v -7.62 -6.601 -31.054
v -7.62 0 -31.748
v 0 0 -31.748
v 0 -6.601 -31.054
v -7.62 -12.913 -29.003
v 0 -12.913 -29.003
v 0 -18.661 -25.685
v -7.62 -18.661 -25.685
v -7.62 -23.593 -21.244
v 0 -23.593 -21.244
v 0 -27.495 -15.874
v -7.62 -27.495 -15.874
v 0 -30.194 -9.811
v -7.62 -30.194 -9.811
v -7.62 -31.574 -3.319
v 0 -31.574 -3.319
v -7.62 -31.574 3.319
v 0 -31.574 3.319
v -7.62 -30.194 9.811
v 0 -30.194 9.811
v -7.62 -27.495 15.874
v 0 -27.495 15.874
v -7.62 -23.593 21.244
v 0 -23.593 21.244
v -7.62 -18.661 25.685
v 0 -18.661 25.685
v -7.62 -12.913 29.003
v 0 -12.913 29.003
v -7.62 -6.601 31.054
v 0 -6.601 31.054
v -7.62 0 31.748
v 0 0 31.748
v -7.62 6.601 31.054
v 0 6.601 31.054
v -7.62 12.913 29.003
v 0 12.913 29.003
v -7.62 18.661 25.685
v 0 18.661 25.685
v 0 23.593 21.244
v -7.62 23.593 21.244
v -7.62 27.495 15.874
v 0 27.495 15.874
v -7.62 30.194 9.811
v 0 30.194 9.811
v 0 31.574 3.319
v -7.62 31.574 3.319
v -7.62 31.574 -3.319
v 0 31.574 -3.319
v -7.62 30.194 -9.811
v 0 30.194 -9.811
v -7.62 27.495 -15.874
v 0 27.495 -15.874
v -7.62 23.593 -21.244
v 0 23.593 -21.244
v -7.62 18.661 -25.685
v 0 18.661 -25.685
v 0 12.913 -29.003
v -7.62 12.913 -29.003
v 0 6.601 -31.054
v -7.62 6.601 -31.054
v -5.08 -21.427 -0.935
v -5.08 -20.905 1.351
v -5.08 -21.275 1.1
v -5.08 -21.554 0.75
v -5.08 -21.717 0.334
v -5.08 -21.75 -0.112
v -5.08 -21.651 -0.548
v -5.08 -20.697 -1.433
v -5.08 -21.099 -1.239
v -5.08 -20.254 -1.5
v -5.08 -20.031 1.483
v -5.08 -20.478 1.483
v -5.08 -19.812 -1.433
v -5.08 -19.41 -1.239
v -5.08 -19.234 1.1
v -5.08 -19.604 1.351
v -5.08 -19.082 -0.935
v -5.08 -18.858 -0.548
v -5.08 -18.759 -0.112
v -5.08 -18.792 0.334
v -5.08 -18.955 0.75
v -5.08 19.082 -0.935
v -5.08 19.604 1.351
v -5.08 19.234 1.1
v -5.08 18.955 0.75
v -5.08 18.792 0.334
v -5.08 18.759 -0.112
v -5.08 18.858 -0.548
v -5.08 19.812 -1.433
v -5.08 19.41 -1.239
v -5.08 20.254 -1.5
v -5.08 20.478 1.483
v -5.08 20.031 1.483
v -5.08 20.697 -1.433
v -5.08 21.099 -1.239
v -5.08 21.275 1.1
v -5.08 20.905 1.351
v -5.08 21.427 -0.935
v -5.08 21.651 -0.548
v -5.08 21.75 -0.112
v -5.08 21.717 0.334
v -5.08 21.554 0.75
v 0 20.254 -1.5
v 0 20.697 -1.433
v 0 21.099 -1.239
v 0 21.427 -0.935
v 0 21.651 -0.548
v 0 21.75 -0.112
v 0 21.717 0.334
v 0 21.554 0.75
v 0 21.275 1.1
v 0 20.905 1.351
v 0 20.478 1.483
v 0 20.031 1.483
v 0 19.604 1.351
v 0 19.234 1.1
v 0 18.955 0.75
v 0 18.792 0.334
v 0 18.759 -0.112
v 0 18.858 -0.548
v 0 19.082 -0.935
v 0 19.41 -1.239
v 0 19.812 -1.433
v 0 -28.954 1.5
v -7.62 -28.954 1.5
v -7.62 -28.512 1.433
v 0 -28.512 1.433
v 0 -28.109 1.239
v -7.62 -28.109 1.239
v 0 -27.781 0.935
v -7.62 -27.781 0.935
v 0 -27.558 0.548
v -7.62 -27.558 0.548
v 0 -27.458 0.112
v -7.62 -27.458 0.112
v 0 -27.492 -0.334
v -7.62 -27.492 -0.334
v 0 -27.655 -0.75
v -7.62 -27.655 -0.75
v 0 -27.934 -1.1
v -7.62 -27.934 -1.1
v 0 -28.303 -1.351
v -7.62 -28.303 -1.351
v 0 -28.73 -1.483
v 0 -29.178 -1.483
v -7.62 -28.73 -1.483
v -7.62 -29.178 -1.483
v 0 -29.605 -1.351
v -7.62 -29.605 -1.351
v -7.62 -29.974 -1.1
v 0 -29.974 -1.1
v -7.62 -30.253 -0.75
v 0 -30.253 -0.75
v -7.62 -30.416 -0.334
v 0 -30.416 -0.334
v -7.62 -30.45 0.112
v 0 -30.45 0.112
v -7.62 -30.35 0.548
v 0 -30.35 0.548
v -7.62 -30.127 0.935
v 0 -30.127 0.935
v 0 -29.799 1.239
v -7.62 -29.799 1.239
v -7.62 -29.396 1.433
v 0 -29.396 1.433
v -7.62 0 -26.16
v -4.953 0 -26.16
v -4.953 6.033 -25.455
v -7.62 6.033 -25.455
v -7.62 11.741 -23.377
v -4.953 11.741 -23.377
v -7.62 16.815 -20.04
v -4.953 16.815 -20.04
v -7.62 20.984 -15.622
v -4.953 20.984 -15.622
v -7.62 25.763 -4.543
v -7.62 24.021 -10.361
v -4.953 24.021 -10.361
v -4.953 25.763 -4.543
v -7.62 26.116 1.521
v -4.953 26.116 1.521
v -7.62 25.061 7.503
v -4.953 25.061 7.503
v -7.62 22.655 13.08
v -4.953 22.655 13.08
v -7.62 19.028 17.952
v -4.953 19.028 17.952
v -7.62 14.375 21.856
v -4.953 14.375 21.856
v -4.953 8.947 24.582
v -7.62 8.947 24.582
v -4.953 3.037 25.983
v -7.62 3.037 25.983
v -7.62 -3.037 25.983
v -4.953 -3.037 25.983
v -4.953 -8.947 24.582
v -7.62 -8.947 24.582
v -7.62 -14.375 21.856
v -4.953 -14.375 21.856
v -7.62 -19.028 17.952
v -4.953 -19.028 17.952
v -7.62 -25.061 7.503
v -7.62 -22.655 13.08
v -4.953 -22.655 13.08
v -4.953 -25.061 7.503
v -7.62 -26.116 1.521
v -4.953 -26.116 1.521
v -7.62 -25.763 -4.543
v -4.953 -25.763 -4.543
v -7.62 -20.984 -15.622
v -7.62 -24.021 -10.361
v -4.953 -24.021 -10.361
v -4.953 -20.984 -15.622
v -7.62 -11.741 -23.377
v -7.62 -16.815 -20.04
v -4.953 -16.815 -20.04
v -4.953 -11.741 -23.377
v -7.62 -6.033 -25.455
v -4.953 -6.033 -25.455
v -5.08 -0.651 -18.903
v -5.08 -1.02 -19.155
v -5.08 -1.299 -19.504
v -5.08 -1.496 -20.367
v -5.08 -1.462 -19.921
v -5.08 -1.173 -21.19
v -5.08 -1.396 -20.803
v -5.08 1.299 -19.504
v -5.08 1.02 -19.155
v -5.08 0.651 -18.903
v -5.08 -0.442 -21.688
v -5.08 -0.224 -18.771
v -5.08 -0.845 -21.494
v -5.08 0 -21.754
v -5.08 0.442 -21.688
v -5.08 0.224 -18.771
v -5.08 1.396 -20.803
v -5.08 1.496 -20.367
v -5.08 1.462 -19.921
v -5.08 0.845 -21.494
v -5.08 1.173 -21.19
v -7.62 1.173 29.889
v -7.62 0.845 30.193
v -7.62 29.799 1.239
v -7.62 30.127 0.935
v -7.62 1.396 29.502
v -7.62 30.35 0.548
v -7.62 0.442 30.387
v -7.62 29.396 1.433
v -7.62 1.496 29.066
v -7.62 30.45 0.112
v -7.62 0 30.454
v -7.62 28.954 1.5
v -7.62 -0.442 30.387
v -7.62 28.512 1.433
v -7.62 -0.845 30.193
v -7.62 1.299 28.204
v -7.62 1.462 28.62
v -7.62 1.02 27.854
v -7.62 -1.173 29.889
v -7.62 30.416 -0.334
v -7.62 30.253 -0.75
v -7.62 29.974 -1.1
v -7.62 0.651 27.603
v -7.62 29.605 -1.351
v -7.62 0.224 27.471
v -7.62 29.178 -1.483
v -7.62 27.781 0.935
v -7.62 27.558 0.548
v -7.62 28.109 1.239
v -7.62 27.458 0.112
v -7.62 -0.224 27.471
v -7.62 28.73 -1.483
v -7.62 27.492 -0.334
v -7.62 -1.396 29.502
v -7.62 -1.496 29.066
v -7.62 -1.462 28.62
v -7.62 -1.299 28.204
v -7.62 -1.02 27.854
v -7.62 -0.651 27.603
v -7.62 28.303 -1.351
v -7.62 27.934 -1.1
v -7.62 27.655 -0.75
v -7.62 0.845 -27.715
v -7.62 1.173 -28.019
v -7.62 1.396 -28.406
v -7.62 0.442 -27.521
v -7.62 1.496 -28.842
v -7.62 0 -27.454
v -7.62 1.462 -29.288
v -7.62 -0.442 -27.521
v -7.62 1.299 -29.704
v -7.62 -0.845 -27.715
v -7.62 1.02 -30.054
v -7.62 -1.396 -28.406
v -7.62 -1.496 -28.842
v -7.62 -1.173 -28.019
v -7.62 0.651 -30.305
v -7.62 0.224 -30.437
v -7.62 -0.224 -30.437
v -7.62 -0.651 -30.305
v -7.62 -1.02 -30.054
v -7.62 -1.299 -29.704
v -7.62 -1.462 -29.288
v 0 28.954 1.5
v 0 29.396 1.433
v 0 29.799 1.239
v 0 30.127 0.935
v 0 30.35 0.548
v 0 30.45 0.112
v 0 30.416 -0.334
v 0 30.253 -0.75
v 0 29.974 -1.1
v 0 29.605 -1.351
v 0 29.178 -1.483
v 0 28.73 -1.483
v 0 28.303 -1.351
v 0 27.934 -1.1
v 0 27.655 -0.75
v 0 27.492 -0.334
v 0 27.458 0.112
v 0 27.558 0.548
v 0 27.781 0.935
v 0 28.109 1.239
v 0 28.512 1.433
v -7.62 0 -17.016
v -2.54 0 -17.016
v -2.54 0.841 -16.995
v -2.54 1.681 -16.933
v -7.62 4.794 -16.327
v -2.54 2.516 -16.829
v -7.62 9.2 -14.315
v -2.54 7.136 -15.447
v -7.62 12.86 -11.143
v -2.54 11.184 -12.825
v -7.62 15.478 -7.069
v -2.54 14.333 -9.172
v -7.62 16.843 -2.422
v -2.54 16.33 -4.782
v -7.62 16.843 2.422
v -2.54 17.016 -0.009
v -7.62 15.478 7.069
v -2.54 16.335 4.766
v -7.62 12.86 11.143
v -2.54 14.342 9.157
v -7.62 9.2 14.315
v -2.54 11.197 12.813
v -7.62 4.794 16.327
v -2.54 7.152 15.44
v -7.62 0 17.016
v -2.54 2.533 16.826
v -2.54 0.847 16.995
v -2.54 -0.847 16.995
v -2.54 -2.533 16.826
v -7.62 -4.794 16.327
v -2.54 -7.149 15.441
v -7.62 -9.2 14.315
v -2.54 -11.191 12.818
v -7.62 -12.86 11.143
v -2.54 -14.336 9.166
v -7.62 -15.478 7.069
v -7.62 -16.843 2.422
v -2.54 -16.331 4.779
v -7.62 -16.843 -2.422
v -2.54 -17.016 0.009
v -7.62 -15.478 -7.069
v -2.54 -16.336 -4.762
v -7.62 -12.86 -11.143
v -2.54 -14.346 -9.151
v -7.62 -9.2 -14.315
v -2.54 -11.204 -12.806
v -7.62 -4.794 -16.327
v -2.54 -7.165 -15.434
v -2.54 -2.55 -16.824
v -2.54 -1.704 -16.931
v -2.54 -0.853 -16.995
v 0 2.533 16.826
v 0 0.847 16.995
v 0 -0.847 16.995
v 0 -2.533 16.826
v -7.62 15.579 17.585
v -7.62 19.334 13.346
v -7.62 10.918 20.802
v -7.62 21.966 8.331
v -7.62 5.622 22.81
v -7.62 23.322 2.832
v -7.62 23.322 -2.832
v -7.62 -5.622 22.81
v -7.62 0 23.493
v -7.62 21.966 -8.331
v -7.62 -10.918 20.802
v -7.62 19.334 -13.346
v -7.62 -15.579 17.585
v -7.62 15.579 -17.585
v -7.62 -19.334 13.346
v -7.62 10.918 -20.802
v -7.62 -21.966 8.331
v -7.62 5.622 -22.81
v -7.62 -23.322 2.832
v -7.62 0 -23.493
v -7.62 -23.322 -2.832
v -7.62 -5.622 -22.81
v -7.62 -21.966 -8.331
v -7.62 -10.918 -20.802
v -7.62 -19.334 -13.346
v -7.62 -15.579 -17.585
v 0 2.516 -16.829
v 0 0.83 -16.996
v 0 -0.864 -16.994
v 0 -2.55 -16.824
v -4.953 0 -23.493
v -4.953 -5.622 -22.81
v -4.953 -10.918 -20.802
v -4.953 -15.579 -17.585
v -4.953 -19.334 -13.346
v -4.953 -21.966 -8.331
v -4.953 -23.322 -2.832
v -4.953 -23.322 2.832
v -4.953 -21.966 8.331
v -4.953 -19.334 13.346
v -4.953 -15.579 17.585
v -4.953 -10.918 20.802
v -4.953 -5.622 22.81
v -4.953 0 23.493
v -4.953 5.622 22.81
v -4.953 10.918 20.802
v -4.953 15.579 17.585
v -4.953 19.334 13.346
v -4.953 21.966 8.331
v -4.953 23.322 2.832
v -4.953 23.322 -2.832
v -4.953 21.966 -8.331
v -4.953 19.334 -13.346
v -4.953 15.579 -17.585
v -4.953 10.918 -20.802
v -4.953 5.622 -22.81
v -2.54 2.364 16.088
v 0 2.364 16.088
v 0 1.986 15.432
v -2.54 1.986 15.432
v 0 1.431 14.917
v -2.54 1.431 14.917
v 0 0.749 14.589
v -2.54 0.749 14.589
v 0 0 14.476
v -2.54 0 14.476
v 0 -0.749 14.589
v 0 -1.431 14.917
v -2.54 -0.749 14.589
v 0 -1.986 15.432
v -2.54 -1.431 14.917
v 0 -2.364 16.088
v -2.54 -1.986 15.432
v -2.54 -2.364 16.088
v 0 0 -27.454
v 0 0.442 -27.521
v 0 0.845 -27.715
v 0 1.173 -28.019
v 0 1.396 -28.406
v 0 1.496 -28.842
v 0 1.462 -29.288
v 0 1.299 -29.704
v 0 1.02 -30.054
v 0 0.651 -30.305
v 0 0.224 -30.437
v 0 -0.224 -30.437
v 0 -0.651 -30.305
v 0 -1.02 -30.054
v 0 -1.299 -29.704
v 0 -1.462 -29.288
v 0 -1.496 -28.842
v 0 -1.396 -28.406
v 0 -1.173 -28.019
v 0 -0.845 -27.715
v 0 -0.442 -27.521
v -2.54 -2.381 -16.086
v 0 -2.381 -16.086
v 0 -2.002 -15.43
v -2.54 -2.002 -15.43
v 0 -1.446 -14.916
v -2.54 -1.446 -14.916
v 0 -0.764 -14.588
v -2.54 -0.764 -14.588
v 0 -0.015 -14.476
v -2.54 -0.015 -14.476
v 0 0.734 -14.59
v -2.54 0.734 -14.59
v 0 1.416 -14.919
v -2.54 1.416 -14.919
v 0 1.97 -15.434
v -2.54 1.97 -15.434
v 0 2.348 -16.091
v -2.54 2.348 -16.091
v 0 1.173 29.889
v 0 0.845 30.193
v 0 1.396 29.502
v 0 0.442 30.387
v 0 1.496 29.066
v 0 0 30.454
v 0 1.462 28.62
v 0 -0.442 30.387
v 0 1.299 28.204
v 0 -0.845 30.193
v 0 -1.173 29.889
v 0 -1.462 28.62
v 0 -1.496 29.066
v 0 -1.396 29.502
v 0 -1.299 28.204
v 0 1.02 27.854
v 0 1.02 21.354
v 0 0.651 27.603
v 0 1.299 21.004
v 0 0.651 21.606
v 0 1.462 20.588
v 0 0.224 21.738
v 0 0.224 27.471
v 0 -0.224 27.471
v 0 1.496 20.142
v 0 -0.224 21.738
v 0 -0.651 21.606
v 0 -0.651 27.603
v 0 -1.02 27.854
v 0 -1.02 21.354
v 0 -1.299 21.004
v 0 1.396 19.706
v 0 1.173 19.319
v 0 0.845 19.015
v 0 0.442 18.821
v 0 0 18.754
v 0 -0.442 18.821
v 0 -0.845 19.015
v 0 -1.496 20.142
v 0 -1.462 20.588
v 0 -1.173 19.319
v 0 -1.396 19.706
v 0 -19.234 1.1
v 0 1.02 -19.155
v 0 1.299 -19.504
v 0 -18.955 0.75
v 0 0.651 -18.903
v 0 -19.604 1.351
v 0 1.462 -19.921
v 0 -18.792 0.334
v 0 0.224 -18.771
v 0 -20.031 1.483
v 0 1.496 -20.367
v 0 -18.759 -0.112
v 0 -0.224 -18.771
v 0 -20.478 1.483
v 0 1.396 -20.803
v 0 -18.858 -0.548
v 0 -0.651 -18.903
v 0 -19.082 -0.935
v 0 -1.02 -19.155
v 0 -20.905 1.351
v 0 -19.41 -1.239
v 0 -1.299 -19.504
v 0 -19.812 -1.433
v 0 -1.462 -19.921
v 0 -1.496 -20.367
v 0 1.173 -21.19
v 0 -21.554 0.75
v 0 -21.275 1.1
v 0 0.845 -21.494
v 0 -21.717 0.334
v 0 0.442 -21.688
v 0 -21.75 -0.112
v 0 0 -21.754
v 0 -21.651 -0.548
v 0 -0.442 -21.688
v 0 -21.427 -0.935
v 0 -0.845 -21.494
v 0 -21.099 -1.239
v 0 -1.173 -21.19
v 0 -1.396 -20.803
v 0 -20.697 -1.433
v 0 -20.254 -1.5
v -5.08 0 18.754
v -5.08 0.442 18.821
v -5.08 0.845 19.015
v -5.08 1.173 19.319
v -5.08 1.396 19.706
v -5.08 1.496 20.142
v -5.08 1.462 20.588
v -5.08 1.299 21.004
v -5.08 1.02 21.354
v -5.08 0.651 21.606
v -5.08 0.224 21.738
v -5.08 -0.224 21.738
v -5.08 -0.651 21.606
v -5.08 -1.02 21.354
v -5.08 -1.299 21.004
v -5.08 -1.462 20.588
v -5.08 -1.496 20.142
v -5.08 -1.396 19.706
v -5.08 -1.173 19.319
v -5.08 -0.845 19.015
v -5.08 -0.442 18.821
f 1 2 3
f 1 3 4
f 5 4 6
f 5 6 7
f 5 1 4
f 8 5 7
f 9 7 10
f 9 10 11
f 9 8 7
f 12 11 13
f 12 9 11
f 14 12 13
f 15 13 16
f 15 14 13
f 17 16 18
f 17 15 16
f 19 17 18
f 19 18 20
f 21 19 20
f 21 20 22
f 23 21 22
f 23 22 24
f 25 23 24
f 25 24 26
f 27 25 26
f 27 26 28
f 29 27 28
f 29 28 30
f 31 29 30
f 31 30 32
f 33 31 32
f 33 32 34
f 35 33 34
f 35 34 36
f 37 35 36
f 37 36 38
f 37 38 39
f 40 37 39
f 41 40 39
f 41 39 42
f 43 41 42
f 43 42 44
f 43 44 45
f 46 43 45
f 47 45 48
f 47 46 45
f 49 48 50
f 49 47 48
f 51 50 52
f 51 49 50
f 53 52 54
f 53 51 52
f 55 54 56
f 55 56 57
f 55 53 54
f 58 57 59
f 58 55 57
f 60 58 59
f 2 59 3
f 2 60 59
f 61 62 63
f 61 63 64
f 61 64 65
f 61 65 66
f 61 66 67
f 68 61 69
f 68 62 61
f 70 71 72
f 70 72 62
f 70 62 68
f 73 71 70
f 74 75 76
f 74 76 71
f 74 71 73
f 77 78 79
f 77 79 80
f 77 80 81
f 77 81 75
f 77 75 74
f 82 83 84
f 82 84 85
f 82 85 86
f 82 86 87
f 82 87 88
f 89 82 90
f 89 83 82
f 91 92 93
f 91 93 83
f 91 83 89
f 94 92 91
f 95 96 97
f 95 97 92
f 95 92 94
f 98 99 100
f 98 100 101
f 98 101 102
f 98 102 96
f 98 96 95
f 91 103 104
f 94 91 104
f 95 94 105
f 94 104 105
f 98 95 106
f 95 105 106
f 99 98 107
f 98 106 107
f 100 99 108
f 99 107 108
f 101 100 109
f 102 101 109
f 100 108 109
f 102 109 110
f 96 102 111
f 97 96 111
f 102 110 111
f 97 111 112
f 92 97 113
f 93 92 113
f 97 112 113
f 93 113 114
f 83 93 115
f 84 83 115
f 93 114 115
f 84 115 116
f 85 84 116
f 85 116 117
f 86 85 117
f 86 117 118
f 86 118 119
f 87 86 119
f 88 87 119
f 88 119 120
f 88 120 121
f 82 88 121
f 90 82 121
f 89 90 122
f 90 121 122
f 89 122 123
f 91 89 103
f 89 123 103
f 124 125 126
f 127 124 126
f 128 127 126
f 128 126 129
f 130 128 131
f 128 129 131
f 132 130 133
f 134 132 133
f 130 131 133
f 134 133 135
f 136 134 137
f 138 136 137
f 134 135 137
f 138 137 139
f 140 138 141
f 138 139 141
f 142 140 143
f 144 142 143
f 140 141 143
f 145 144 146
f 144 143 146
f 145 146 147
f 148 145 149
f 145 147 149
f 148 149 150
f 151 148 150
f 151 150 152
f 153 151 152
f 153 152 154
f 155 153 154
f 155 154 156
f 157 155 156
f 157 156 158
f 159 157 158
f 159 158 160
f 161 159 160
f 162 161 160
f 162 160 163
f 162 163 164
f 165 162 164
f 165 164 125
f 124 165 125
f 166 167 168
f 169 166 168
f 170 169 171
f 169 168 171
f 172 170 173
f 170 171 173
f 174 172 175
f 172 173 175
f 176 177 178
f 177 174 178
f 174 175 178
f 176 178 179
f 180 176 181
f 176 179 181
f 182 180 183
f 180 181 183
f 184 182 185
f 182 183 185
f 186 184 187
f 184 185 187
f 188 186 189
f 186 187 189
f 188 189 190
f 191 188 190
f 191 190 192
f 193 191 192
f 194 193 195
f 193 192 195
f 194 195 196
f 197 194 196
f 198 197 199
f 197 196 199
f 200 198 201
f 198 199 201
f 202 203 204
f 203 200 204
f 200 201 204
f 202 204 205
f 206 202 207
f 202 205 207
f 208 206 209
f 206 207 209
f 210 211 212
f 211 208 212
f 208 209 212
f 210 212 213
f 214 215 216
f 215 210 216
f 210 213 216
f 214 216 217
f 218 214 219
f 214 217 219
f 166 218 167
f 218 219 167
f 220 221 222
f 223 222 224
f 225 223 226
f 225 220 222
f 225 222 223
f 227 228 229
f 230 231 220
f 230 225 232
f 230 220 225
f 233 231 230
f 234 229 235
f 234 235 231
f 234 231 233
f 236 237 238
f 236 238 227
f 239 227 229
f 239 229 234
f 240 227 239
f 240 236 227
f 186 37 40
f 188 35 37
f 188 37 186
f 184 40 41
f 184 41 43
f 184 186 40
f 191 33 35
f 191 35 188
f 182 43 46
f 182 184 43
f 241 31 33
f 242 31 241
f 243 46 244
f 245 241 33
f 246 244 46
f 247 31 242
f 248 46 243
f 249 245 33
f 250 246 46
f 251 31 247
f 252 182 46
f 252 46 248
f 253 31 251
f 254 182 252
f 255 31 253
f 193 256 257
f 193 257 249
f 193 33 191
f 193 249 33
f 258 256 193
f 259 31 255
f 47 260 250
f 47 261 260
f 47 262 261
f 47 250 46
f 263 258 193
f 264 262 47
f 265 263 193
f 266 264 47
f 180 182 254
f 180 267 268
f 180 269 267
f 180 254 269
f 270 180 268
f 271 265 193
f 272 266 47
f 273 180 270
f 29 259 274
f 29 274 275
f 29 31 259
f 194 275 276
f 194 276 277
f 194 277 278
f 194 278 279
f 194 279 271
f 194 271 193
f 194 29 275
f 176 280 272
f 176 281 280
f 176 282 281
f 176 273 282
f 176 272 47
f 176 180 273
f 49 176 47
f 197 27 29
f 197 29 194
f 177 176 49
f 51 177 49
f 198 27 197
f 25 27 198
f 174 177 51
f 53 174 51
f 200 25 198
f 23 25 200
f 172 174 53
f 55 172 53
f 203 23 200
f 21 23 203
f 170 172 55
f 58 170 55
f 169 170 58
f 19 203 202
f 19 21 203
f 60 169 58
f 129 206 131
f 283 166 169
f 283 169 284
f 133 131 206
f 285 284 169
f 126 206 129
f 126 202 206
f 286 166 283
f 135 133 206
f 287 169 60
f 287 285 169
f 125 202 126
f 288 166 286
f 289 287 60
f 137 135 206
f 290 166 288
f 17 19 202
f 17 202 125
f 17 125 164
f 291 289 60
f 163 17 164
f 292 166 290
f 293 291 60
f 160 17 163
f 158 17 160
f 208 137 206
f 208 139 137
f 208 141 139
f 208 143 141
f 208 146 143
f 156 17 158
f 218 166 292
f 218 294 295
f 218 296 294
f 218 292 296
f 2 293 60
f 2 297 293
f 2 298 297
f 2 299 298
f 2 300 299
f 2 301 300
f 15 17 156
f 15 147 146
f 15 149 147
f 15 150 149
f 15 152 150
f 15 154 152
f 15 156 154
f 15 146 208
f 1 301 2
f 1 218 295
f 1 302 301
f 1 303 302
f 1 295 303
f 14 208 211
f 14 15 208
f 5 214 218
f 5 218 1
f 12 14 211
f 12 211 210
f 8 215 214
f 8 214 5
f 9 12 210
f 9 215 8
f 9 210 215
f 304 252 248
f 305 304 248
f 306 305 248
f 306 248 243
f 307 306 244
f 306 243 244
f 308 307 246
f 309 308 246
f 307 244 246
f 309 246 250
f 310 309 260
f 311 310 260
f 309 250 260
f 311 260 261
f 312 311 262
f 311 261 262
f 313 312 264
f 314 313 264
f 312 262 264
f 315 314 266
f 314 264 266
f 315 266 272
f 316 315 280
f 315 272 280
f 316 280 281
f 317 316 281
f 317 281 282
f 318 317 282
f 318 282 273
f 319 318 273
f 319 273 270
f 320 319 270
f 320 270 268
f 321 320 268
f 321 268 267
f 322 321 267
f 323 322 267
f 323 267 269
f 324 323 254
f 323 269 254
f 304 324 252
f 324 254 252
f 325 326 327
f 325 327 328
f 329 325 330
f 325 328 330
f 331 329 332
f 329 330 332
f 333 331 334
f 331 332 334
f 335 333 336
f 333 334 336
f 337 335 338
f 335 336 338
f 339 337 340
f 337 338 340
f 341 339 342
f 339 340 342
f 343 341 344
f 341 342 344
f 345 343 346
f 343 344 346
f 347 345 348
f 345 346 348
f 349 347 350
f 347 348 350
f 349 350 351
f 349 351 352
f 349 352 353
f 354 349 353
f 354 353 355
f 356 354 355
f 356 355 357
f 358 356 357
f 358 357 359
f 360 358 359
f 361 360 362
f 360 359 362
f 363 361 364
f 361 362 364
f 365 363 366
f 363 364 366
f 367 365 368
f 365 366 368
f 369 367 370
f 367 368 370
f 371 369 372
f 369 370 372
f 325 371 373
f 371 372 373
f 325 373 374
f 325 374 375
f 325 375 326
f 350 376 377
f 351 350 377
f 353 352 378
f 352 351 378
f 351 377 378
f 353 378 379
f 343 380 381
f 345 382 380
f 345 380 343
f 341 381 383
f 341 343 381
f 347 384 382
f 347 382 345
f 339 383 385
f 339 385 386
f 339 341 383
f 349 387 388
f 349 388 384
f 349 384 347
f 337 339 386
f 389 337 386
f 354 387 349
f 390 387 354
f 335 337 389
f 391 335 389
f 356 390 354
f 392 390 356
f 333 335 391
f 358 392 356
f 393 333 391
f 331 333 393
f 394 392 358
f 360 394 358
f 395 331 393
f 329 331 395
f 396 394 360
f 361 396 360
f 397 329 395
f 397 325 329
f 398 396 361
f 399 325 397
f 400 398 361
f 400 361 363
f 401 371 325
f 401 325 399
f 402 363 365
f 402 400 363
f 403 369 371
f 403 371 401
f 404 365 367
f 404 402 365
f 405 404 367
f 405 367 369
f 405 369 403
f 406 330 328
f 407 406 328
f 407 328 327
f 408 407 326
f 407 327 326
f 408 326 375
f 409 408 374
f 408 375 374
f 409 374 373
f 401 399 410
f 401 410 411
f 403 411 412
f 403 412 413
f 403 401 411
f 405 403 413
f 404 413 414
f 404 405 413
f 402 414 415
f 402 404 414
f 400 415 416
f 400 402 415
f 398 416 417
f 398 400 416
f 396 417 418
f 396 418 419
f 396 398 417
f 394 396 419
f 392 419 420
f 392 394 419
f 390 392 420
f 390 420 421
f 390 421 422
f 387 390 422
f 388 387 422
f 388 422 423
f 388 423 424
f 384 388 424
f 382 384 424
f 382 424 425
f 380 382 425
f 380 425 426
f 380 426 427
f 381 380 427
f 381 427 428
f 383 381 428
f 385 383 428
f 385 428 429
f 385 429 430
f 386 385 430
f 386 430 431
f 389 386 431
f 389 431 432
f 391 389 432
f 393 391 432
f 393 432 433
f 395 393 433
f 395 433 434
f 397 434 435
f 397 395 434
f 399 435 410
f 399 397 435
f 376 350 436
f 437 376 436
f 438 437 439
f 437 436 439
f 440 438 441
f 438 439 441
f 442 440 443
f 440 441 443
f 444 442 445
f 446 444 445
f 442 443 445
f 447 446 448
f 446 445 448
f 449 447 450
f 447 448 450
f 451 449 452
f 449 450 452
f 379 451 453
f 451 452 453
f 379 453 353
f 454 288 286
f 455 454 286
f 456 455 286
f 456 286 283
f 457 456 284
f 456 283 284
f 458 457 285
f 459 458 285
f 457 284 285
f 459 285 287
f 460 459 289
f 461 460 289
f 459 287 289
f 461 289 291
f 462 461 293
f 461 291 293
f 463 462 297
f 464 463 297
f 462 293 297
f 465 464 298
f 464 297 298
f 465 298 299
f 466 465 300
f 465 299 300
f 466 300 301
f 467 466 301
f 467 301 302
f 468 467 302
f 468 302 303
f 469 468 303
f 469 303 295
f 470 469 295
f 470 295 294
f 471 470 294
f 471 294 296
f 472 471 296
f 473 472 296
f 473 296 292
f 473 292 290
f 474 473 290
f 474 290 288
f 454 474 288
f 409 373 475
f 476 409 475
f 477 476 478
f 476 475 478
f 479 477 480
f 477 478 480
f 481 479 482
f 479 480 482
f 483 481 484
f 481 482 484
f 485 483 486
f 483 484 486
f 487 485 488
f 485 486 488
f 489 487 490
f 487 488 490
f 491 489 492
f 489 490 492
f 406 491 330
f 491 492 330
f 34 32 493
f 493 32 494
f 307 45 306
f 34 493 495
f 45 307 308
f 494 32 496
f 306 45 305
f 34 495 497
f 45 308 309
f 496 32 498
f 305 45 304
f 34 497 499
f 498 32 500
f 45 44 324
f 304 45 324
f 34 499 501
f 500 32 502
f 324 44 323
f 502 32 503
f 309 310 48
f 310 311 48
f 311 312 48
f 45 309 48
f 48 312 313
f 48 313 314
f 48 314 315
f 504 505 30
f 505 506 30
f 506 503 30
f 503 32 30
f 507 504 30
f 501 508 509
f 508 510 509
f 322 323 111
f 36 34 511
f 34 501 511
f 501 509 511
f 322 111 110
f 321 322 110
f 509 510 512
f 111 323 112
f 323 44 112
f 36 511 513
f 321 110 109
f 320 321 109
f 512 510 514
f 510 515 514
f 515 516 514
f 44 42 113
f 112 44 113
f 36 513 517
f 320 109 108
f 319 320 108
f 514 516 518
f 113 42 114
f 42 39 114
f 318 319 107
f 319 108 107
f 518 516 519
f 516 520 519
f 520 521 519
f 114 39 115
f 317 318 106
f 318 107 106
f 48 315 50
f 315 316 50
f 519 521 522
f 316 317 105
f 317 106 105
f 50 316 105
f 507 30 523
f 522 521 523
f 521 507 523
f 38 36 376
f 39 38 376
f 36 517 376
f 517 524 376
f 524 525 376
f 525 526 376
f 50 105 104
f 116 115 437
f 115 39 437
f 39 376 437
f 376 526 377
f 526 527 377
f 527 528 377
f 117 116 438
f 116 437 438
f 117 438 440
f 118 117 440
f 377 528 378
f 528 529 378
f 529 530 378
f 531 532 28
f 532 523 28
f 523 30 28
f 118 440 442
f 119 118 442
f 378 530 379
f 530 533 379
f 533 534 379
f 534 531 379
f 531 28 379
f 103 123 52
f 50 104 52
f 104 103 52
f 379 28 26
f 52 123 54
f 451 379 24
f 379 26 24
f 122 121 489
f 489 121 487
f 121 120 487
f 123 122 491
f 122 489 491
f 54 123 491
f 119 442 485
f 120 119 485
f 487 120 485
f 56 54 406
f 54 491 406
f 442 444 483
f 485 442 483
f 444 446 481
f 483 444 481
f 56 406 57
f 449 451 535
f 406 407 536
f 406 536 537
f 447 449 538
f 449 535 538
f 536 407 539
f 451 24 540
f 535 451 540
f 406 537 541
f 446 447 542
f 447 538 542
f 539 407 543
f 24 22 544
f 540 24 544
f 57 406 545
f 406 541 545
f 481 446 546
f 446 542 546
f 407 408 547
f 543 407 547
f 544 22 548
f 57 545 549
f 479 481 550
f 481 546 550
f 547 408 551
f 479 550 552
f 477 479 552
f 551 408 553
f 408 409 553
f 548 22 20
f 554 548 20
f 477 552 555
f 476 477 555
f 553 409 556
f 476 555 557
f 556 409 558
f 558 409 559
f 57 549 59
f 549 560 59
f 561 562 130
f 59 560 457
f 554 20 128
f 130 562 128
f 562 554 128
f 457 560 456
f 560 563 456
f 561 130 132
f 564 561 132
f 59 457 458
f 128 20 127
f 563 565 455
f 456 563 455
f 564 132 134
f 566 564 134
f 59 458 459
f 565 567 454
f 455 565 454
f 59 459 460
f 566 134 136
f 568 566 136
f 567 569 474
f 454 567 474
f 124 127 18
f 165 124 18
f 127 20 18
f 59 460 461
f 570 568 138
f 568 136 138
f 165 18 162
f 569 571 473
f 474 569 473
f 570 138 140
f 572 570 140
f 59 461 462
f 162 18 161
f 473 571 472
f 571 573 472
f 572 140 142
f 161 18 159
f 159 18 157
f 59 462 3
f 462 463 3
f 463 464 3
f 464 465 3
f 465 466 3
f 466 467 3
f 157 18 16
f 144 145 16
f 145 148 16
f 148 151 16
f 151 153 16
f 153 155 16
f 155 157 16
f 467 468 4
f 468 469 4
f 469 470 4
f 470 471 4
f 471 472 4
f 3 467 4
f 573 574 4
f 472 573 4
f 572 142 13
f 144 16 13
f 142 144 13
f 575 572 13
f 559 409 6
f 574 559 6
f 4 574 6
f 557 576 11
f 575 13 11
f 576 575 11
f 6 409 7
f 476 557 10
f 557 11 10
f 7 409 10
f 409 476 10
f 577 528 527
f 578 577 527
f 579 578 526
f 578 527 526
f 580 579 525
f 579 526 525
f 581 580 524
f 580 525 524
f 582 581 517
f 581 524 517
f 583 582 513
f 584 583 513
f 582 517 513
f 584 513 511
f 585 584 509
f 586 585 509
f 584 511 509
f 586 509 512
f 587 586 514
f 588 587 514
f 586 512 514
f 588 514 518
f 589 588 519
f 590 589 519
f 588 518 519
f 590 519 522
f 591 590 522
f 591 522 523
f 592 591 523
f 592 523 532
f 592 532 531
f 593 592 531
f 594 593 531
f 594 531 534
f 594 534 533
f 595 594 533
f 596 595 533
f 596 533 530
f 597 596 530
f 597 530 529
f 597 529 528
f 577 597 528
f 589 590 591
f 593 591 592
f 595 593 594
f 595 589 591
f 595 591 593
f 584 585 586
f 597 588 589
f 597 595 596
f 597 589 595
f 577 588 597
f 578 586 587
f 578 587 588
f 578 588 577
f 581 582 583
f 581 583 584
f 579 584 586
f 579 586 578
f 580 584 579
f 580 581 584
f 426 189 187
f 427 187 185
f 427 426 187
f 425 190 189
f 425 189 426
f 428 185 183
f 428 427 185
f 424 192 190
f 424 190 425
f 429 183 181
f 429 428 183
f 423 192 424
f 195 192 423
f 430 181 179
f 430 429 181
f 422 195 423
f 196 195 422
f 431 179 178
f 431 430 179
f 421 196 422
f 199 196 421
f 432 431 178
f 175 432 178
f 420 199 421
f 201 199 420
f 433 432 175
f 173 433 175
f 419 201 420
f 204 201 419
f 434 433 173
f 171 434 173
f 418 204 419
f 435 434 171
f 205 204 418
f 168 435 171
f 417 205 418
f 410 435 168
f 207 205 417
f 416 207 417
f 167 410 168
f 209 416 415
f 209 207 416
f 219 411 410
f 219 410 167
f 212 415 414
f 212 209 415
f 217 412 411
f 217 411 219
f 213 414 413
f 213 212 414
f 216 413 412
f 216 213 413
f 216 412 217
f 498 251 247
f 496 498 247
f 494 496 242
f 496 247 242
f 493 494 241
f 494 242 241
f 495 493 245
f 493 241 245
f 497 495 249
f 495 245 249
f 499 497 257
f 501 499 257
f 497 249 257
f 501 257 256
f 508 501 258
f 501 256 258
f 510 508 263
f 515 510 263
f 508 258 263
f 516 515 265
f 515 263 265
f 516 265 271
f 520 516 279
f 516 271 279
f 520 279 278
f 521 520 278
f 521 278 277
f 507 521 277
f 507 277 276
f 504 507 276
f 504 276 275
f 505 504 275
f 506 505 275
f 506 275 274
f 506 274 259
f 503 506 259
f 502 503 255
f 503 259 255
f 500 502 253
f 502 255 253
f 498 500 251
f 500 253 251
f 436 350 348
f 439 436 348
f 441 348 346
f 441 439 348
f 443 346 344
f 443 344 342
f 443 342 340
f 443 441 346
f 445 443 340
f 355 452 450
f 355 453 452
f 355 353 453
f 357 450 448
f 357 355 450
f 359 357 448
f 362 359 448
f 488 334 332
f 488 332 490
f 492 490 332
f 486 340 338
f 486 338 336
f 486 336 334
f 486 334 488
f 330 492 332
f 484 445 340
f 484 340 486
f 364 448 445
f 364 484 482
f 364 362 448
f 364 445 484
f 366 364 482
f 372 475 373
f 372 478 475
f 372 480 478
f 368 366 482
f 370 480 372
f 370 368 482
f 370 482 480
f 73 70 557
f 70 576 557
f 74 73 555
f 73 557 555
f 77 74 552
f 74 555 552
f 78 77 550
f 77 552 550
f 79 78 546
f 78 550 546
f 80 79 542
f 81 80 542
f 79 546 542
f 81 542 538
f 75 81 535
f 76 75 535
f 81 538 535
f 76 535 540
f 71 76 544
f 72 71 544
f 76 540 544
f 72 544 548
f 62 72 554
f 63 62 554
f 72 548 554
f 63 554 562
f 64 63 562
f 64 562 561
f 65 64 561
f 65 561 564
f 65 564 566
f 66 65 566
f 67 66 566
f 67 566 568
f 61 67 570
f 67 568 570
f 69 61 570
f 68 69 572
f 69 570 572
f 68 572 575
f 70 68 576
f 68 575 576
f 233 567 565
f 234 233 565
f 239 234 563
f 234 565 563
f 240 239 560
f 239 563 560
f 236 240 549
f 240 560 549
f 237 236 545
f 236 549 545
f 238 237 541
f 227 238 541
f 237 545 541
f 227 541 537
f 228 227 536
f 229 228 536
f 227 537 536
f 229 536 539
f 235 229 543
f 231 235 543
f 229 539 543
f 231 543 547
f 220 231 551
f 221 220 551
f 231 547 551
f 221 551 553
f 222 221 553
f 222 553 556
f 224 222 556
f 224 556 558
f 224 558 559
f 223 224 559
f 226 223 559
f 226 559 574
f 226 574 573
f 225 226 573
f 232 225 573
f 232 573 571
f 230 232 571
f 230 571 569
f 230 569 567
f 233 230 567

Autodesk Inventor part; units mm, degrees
ref_plane "YZ Plane" through (0, 0, 0) normal (1, 0, 0) x (0, 1, 0)
ref_plane "XZ Plane" through (0, 0, 0) normal (0, 1, 0) x (-1, 0, 0)
ref_plane "XY Plane" through (0, 0, 0) normal (0, 0, 1) x (1, 0, 0)
sketch "Sketch1" plane through (0, 0, 0) normal (0, 1, 0) x (-1, 0, 0)
  line L0 (0, 0) -> (0, -31.748)
  line L1 (0, -31.748) -> (7.62, -31.748)
  line L2 (7.62, -31.748) -> (7.62, -26.16)
  line L3 (7.62, -26.16) -> (4.953, -26.16)
  line L4 (4.953, -26.16) -> (4.953, -23.493)
  line L5 (4.953, -23.493) -> (7.62, -23.493)
  line L6 (7.62, -23.493) -> (7.62, -17.016)
  line L7 (7.62, -17.016) -> (2.54, -17.016)
  line L8 (2.54, -17.016) -> (2.54, 0)
  line L9 (0, 0) -> (2.54, 0)
  dimension "d0" = 31.748
  dimension "d1" = 7.62
  dimension "d2" = 5.588
  dimension "d3" = 2.667
  dimension "d4" = 2.667
  dimension "d5" = 6.477
  dimension "d6" = 5.08
  dimension "d7" = 2.54
revolve "Revolution1" add sketch "Sketch1" angle 360 about axis through (0, 0, 0) along (-1, 0, 0)
sketch "Sketch2" plane through (-7.62, 0, 0) normal (-1, 0, 0) x (0, 0, 1)
  circle A0 centre (28.954, 0) radius 1.5
  circle A1 centre (0, 0) radius 31.748 projected
  line L0 (31.748, 0) -> (26.16, 0)
  circle A2 centre (0, 0) radius 26.16 projected
  circle A3 centre (0, 28.954) radius 1.5
  circle A4 centre (-28.954, 0) radius 1.5
  circle A5 centre (0, -28.954) radius 1.5
  dimension "d9" = 3
  dimension "d12" = 360
extrude "Extrusion1" cut sketch "Sketch2" against normal blind 12.7 contours L0 A0 | A0 L0 | A3 | A4 | A5
sketch "Sketch3" plane through (0, 0, 0) normal (1, 0, 0) x (0, 0, -1)
  circle A0 centre (0, 0) radius 23.493 projected
  circle A1 centre (0, 0) radius 20.2545
  circle A2 centre (20.2545, 0) radius 1.5
  circle A3 centre (0, 20.2545) radius 1.5
  circle A4 centre (-20.2545, 0) radius 1.5
  circle A5 centre (0, -20.2545) radius 1.5
  dimension "d17" = 3.2385
  dimension "d18" = 3
  dimension "d21" = 360
sketch "Sketch4" plane through (-7.62, 0, 0) normal (-1, 0, 0) x (0, 0, 1)
  circle A0 centre (0, 0) radius 17.016 projected
  circle A1 centre (0, 0) radius 23.493 projected
  dimension "d16" = 6.477
extrude "Extrusion2" cut sketch "Sketch3" against normal blind 5.08 contours A1 A2 | A1 A2 | A3 A1 | A1 A3 | A5 A1 | A1 A5 | A4 A1 | A1 A4
sketch "Sketch5" plane through (-2.54, 0, 0) normal (-1, 0, 0) x (0, 0, 1)
  circle A0 centre (0, 0) radius 17.016 projected
  line L0 (-17.016, 0) -> (17.016, 0)
  line L1 (-14.478, -9.9949) -> (14.478, -9.9949)
  line L2 (-14.478, 9.9949) -> (14.478, 9.9949)
  line L3 (14.478, 9.9949) -> (14.478, -9.9949)
  line L4 (-14.478, 9.9949) -> (-14.478, -9.9949)
  arc A1 (16.8267, -2.5309) -> (16.8267, 2.5309) centre (0, 0) ccw
  point P0 (0, 9.9949)
  point P1 (14.478, 0)
  dimension "d25" = 28.956
  dimension "d26" = 19.9898
sketch "Sketch6" plane through (-7.62, 0, 0) normal (-1, 0, 0) x (0, 0, 1)
  circle A0 centre (0, 0) radius 17.016 projected
  circle A1 centre (17.016, 0) radius 2.54
  arc A2 (16.8264, -2.5329) -> (16.8264, 2.5329) centre (0, 0) ccw
  circle A3 centre (-17.016, -0.0173) radius 2.54
  arc A4 (-16.829, 2.5158) -> (-16.8238, -2.55) centre (0, 0) ccw
  dimension "d27" = 5.08
  dimension "d28" = 5.08
extrude "Extrusion3" cut sketch "Sketch6" against normal blind 12.7 contours A0 A1 | A3 A0 picked at (16.1885, -0.4913) picked at (-16.1553, -0.0173)
sketch "Sketch7" plane through (-2.54, 0, 17.016) normal (-1, 0, 0) x (0, 0, 1)
  circle A0 centre (-25.6012, 5.588) radius 1.8288
  circle A1 centre (-8.4308, 5.588) radius 1.8288
  arc A2 (-33.8398, -2.55) -> (-33.8449, 2.5158) centre (-34.0319, -0.0173) ccw projected
  line L0 (-31.4919, -0.0173) -> (-2.4894, -0.0173) construction
  line L1 (-25.6012, 5.588) -> (-8.4308, 5.588)
  circle A3 centre (-25.6012, 5.588) radius 1.8288
  circle A4 centre (-8.4308, 5.588) radius 1.8288
  point P0 (-17.016, 0)
  point P1 (-17.016, 5.588)
  dimension "d31" = 3.6576
  dimension "d32" = 3.6576
  dimension "d33" = 13.5128
  dimension "d34" = 5.588
equation "\"d28\" = d27"
equation "\"d32\" = d31"
